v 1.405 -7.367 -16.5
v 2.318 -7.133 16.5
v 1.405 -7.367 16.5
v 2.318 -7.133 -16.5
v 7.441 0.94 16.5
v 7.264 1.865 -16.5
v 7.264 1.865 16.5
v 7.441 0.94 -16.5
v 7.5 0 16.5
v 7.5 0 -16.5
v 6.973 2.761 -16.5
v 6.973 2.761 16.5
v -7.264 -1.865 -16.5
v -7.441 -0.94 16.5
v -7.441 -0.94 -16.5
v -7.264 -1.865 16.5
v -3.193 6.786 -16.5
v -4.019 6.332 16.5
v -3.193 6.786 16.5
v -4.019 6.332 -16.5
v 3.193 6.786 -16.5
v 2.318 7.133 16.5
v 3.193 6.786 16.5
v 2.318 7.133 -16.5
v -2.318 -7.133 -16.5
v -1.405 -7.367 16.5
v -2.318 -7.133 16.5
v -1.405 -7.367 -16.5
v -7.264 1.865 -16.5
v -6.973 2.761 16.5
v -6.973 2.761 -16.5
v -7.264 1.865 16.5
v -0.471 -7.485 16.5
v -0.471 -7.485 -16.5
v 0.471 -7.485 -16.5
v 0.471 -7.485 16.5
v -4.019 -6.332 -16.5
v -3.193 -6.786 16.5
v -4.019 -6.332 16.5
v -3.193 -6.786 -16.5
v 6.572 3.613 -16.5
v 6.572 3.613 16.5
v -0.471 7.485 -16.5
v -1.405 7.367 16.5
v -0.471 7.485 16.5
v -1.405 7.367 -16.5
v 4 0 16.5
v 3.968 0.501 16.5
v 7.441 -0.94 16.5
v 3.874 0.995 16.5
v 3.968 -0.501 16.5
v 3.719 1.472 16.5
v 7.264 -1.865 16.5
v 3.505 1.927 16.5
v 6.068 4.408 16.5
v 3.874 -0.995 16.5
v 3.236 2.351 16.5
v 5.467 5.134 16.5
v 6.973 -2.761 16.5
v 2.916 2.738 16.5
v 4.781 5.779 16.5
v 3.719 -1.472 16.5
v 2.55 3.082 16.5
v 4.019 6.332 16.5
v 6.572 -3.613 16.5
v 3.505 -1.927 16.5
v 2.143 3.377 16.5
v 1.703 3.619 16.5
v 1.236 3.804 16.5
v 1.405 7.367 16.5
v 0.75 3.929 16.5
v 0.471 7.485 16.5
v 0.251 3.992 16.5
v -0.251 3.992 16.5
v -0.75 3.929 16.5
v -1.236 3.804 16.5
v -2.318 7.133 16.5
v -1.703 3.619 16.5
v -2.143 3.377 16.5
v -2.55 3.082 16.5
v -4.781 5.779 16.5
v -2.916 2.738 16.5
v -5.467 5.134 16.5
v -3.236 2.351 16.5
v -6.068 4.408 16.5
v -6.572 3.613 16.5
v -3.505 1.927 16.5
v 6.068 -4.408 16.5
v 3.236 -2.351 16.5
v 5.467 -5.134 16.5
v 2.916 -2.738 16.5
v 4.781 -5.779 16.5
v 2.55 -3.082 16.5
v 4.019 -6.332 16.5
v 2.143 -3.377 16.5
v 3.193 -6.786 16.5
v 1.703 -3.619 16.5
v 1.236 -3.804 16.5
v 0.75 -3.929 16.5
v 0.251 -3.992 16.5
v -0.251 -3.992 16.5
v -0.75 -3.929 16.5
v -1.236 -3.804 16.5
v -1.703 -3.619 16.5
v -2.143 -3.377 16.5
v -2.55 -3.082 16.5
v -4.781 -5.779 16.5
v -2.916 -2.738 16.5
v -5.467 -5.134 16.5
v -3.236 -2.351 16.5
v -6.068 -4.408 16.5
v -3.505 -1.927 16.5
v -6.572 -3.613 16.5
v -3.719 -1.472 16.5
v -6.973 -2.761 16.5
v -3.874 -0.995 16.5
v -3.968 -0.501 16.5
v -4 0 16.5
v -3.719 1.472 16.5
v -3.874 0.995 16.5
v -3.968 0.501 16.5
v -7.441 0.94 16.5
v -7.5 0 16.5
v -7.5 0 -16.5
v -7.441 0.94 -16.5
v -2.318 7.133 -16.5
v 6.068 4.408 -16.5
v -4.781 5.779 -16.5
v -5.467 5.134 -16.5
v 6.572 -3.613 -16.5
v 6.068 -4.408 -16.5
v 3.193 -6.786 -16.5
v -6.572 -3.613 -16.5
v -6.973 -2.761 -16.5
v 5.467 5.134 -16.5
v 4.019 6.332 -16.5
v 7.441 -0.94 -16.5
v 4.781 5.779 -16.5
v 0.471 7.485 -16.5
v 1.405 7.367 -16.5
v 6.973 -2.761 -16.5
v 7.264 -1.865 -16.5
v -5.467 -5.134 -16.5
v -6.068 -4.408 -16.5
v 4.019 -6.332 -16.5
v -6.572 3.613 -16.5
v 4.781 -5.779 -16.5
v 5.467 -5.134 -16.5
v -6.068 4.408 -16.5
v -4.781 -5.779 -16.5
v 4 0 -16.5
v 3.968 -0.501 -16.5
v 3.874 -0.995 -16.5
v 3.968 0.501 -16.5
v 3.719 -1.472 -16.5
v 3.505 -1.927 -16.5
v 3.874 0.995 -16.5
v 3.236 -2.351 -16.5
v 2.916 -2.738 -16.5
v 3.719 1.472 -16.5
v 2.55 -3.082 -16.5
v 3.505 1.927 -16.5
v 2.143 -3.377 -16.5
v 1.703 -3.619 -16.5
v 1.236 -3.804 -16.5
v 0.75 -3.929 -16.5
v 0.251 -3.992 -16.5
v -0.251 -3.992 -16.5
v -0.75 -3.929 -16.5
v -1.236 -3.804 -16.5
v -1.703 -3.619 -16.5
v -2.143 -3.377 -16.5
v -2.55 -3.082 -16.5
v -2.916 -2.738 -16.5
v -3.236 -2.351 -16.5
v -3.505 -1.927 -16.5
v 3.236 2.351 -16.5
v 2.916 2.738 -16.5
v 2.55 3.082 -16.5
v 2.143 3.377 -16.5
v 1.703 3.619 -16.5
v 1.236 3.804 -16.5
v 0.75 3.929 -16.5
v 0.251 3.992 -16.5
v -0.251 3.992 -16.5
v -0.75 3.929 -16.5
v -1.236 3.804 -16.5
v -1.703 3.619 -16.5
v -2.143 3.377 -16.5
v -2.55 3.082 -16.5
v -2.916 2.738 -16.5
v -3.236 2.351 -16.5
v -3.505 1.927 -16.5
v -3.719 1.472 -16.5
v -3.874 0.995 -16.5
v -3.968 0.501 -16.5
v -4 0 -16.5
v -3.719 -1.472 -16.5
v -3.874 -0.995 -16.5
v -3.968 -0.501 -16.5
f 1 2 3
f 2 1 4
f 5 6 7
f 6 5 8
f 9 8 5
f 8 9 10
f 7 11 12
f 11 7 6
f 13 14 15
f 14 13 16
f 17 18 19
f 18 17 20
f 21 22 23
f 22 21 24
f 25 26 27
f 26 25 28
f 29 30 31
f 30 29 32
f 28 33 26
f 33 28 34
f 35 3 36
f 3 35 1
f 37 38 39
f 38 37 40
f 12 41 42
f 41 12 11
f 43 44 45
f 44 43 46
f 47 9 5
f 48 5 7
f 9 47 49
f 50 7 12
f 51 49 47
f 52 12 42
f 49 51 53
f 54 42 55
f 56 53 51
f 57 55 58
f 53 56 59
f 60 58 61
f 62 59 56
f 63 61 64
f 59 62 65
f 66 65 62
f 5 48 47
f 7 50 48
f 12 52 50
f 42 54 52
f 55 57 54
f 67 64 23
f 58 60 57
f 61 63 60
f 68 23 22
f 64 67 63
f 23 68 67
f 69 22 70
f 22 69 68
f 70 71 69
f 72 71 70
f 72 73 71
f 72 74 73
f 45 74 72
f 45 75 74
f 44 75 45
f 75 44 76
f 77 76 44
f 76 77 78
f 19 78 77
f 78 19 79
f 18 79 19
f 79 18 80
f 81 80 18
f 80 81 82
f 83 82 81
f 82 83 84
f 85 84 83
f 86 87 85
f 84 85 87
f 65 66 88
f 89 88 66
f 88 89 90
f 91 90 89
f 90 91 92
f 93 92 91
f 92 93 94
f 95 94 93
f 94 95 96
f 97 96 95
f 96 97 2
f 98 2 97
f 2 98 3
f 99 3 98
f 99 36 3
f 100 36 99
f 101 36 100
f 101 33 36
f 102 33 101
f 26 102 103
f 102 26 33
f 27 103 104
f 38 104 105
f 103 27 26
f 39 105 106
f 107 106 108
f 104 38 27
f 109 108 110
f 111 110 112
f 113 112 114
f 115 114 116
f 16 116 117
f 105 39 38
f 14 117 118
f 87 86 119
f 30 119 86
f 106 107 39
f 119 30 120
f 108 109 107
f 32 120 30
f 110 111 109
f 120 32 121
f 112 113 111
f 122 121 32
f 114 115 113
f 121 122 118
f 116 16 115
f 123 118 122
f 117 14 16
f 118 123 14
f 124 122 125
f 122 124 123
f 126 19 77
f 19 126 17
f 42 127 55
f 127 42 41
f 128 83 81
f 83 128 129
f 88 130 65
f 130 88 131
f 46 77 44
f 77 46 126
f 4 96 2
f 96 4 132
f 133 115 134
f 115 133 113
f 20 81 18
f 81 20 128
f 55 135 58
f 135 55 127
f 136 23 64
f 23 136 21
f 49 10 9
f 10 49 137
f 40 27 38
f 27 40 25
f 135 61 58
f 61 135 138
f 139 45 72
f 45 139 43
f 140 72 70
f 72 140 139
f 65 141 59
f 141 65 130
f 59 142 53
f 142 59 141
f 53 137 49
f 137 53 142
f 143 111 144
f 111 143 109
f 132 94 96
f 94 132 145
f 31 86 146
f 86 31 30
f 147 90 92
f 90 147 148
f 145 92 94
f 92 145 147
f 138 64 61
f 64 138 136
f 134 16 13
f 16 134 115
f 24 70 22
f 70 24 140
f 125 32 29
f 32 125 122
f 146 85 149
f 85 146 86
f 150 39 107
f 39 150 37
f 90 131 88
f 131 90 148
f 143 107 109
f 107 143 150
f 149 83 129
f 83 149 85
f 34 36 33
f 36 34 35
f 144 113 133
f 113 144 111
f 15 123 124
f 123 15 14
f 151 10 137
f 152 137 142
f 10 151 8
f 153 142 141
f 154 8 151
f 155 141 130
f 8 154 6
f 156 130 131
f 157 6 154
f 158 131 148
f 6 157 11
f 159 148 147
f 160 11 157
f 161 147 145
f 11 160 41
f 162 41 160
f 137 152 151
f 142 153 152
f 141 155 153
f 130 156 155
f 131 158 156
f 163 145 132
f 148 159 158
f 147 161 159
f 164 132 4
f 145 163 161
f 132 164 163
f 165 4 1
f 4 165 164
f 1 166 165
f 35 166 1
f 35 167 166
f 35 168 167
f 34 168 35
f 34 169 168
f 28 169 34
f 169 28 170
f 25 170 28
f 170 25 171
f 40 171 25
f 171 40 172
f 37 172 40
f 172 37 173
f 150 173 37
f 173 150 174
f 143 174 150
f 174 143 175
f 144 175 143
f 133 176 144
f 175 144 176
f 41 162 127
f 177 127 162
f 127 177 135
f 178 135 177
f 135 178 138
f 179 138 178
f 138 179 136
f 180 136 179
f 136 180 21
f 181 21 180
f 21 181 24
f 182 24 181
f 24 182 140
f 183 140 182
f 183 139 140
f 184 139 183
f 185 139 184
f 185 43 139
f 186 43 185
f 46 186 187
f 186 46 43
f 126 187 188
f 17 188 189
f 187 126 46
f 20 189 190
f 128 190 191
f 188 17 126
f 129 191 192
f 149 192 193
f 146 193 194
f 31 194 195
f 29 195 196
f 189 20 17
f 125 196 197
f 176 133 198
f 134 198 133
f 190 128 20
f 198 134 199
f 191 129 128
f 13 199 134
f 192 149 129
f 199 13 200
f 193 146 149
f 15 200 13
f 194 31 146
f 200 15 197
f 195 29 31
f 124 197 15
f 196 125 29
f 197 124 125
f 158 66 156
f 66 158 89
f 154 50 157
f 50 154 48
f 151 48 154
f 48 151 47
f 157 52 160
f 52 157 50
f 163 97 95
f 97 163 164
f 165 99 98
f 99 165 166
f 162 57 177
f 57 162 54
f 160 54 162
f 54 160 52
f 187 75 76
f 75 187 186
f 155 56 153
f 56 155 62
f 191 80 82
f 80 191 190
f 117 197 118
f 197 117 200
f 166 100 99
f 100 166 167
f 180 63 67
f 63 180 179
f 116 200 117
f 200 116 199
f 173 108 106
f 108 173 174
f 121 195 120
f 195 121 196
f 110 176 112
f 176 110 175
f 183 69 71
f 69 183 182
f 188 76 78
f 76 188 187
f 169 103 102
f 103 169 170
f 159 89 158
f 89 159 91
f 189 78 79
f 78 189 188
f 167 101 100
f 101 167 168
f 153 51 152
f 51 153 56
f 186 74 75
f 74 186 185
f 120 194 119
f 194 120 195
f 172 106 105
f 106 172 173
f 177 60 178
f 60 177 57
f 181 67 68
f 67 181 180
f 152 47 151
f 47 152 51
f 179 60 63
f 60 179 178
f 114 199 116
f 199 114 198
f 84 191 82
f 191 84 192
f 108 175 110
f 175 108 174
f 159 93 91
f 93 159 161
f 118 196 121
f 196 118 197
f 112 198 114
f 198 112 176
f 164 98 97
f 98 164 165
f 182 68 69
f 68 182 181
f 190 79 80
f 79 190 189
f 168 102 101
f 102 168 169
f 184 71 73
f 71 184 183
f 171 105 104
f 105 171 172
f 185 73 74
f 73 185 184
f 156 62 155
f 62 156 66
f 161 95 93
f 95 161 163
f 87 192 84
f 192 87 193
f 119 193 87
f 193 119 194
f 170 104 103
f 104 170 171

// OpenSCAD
$fn = 50;


difference() {
	union() {
		translate(v = [0, 0, -16.5000000000]) {
			cylinder(h = 33, r = 7.5000000000);
		}
	}
	union() {
		translate(v = [0, 0, -100.0000000000]) {
			cylinder(h = 200, r = 4.0000000000);
		}
	}
}
